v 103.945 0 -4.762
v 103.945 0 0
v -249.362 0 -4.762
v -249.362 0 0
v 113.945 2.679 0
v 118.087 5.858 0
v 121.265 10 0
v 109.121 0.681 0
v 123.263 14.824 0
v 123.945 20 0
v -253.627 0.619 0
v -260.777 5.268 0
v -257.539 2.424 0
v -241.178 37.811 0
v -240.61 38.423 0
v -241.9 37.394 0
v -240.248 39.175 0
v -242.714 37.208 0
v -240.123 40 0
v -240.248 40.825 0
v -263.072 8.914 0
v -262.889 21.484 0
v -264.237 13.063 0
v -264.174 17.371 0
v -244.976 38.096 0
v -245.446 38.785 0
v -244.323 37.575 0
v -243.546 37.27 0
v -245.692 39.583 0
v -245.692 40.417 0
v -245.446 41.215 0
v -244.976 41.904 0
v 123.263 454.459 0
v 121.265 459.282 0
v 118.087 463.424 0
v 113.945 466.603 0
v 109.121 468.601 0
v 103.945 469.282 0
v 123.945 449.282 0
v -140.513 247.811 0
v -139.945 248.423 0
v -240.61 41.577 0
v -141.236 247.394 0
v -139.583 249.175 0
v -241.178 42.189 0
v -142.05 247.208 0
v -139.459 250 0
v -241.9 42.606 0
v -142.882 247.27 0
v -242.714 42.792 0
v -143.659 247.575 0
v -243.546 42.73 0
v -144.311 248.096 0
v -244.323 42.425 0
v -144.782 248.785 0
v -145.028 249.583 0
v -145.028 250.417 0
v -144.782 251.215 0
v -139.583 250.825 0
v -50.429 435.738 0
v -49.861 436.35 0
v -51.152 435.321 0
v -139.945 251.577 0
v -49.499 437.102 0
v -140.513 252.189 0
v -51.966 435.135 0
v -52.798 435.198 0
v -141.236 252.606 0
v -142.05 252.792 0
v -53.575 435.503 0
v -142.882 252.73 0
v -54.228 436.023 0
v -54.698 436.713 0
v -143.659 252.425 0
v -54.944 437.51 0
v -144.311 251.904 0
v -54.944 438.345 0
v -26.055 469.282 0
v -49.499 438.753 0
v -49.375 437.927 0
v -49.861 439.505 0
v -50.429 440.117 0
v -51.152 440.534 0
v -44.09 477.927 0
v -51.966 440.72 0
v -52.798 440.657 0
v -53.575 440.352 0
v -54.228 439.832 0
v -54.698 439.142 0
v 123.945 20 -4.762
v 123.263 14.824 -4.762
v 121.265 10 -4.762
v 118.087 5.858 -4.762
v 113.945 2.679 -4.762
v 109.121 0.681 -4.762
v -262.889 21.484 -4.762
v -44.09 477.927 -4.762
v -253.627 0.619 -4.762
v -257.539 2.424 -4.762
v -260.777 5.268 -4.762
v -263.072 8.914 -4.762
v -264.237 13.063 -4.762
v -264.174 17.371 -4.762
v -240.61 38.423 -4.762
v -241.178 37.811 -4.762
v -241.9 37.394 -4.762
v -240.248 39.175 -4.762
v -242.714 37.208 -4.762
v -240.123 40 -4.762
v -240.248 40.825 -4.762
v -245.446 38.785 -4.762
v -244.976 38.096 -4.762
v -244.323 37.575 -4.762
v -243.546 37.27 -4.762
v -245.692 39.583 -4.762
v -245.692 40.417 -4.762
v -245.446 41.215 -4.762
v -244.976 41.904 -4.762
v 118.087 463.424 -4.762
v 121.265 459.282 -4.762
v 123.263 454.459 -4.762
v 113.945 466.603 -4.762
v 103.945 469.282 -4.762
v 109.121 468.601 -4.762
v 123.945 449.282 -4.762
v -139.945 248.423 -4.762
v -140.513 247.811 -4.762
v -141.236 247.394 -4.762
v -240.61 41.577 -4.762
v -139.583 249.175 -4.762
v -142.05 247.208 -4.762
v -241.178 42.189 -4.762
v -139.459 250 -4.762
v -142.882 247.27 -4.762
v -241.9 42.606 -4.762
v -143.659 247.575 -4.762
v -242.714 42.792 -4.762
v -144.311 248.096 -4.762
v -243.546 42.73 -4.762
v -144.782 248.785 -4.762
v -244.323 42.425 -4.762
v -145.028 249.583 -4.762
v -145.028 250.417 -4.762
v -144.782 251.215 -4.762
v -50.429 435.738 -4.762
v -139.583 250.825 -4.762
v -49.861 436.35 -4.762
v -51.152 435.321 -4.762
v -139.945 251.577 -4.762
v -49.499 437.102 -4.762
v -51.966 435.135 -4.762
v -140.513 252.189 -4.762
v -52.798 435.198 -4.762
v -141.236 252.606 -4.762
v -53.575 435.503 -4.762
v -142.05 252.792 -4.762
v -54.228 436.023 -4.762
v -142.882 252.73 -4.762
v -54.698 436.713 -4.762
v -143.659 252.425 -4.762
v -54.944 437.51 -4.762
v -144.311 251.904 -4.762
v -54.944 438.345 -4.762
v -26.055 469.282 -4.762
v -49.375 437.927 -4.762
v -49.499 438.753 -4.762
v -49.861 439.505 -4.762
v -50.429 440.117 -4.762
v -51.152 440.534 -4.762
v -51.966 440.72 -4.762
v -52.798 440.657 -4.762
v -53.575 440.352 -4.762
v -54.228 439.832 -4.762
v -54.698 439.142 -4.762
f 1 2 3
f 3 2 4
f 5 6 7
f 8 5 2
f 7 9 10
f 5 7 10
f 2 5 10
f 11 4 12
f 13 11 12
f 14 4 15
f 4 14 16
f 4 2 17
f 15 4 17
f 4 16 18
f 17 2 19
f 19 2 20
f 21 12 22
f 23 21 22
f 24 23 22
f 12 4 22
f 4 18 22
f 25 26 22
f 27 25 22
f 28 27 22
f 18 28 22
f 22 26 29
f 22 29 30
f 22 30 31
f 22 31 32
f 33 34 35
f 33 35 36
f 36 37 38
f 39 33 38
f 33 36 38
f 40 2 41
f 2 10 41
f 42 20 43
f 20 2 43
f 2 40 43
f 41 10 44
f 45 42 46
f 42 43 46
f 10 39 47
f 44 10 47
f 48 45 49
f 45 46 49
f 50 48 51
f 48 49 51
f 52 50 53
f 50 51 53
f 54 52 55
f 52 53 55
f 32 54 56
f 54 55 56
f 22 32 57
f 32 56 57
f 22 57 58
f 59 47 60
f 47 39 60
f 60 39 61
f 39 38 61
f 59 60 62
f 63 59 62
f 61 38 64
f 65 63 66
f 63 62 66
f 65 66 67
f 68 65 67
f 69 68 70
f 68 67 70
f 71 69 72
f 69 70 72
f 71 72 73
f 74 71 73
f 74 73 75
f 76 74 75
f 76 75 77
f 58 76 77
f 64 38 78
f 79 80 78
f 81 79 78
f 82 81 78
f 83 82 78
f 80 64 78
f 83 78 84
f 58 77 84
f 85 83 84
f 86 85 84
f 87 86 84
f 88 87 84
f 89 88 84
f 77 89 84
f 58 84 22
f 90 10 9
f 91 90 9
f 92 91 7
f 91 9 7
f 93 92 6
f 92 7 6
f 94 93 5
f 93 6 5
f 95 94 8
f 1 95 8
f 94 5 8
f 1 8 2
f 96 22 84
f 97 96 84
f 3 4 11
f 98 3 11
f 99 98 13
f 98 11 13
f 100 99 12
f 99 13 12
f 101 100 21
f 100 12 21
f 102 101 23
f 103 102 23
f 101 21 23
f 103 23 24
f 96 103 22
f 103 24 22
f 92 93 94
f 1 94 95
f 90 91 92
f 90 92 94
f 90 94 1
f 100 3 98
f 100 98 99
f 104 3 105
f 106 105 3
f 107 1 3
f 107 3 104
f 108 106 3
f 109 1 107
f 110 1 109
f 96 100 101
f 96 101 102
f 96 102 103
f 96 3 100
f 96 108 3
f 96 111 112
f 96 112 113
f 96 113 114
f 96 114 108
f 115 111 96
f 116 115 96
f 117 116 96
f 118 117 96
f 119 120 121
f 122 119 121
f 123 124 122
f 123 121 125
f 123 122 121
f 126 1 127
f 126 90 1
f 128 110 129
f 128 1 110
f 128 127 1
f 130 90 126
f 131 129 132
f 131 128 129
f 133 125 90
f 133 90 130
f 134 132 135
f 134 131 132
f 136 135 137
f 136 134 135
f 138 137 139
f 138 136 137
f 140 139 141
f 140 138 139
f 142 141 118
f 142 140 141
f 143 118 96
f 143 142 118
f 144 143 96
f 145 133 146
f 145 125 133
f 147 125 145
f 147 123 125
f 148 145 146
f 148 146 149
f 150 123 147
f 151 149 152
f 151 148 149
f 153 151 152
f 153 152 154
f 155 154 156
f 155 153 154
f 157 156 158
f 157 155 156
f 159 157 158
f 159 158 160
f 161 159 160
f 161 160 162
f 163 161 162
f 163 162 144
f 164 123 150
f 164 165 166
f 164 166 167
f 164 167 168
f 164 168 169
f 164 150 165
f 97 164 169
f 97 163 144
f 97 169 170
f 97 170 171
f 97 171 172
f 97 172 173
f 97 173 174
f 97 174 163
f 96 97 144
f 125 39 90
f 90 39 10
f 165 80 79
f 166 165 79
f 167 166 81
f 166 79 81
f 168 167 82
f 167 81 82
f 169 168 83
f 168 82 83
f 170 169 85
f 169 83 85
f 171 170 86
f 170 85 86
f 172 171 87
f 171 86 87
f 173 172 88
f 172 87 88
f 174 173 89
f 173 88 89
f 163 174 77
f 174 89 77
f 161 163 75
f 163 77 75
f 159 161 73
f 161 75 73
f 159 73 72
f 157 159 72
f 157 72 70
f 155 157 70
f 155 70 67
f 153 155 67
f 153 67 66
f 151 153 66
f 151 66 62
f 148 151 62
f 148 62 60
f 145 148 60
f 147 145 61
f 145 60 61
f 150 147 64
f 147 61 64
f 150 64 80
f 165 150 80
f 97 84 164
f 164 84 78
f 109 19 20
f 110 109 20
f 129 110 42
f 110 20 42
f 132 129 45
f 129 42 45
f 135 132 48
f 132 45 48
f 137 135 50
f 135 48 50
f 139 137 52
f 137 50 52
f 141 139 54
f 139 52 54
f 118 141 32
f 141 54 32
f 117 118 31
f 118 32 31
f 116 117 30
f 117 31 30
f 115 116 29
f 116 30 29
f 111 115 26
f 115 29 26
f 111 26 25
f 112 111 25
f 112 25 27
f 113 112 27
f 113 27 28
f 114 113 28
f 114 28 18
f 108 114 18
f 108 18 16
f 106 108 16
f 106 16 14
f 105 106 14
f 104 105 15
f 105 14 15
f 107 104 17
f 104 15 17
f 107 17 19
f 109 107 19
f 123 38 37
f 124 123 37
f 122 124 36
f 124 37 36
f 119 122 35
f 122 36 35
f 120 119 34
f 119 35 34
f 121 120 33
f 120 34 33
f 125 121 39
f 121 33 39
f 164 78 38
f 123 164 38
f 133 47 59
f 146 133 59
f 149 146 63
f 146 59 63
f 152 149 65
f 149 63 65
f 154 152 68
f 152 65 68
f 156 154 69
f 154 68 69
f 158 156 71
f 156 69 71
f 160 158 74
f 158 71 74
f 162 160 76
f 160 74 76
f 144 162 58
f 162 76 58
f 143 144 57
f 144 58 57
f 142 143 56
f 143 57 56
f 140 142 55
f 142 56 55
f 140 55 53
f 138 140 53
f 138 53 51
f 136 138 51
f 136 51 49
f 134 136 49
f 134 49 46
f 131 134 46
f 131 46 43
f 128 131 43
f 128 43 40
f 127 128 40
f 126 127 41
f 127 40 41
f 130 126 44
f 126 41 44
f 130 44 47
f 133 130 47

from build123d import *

# Parameters (mm, degrees)
SKETCH1_R           = 2.8
BOSS_EXTRUDE1_DEPTH = 4.7625


with BuildPart() as part:
    # Sketch1 → Boss-Extrude1 (new body)
    with BuildSketch(Plane.XY):
        with BuildLine():
            Line((103.944676345, 0), (-249.362453306, 0))
            ThreePointArc((-249.362453306, 0), (-262.056114412, 7.008068585), (-262.888702501, 21.483870968))
            Line((-262.888702501, 21.483870968), (-44.090322581, 477.927471542))
            Line((-44.090322581, 477.927471542), (-26.055323655, 469.282310251))
            Line((-26.055323655, 469.282310251), (103.944676345, 469.282310251))
            ThreePointArc((103.944676345, 469.282310251), (118.086811969, 463.424445875), (123.944676345, 449.282310251))
            Line((123.944676345, 449.282310251), (123.944676345, 20))
            ThreePointArc((123.944676345, 20), (118.086811969, 5.857864376), (103.944676345, 0))
        make_face()
        with Locations((-52.174961355, 437.927471542)):
            Circle(SKETCH1_R, mode=Mode.SUBTRACT)
        with Locations((-142.258875916, 250)):
            Circle(SKETCH1_R, mode=Mode.SUBTRACT)
        with Locations((-242.923360477, 40)):
            Circle(SKETCH1_R, mode=Mode.SUBTRACT)
    extrude(amount=-BOSS_EXTRUDE1_DEPTH)


solid = part.part
